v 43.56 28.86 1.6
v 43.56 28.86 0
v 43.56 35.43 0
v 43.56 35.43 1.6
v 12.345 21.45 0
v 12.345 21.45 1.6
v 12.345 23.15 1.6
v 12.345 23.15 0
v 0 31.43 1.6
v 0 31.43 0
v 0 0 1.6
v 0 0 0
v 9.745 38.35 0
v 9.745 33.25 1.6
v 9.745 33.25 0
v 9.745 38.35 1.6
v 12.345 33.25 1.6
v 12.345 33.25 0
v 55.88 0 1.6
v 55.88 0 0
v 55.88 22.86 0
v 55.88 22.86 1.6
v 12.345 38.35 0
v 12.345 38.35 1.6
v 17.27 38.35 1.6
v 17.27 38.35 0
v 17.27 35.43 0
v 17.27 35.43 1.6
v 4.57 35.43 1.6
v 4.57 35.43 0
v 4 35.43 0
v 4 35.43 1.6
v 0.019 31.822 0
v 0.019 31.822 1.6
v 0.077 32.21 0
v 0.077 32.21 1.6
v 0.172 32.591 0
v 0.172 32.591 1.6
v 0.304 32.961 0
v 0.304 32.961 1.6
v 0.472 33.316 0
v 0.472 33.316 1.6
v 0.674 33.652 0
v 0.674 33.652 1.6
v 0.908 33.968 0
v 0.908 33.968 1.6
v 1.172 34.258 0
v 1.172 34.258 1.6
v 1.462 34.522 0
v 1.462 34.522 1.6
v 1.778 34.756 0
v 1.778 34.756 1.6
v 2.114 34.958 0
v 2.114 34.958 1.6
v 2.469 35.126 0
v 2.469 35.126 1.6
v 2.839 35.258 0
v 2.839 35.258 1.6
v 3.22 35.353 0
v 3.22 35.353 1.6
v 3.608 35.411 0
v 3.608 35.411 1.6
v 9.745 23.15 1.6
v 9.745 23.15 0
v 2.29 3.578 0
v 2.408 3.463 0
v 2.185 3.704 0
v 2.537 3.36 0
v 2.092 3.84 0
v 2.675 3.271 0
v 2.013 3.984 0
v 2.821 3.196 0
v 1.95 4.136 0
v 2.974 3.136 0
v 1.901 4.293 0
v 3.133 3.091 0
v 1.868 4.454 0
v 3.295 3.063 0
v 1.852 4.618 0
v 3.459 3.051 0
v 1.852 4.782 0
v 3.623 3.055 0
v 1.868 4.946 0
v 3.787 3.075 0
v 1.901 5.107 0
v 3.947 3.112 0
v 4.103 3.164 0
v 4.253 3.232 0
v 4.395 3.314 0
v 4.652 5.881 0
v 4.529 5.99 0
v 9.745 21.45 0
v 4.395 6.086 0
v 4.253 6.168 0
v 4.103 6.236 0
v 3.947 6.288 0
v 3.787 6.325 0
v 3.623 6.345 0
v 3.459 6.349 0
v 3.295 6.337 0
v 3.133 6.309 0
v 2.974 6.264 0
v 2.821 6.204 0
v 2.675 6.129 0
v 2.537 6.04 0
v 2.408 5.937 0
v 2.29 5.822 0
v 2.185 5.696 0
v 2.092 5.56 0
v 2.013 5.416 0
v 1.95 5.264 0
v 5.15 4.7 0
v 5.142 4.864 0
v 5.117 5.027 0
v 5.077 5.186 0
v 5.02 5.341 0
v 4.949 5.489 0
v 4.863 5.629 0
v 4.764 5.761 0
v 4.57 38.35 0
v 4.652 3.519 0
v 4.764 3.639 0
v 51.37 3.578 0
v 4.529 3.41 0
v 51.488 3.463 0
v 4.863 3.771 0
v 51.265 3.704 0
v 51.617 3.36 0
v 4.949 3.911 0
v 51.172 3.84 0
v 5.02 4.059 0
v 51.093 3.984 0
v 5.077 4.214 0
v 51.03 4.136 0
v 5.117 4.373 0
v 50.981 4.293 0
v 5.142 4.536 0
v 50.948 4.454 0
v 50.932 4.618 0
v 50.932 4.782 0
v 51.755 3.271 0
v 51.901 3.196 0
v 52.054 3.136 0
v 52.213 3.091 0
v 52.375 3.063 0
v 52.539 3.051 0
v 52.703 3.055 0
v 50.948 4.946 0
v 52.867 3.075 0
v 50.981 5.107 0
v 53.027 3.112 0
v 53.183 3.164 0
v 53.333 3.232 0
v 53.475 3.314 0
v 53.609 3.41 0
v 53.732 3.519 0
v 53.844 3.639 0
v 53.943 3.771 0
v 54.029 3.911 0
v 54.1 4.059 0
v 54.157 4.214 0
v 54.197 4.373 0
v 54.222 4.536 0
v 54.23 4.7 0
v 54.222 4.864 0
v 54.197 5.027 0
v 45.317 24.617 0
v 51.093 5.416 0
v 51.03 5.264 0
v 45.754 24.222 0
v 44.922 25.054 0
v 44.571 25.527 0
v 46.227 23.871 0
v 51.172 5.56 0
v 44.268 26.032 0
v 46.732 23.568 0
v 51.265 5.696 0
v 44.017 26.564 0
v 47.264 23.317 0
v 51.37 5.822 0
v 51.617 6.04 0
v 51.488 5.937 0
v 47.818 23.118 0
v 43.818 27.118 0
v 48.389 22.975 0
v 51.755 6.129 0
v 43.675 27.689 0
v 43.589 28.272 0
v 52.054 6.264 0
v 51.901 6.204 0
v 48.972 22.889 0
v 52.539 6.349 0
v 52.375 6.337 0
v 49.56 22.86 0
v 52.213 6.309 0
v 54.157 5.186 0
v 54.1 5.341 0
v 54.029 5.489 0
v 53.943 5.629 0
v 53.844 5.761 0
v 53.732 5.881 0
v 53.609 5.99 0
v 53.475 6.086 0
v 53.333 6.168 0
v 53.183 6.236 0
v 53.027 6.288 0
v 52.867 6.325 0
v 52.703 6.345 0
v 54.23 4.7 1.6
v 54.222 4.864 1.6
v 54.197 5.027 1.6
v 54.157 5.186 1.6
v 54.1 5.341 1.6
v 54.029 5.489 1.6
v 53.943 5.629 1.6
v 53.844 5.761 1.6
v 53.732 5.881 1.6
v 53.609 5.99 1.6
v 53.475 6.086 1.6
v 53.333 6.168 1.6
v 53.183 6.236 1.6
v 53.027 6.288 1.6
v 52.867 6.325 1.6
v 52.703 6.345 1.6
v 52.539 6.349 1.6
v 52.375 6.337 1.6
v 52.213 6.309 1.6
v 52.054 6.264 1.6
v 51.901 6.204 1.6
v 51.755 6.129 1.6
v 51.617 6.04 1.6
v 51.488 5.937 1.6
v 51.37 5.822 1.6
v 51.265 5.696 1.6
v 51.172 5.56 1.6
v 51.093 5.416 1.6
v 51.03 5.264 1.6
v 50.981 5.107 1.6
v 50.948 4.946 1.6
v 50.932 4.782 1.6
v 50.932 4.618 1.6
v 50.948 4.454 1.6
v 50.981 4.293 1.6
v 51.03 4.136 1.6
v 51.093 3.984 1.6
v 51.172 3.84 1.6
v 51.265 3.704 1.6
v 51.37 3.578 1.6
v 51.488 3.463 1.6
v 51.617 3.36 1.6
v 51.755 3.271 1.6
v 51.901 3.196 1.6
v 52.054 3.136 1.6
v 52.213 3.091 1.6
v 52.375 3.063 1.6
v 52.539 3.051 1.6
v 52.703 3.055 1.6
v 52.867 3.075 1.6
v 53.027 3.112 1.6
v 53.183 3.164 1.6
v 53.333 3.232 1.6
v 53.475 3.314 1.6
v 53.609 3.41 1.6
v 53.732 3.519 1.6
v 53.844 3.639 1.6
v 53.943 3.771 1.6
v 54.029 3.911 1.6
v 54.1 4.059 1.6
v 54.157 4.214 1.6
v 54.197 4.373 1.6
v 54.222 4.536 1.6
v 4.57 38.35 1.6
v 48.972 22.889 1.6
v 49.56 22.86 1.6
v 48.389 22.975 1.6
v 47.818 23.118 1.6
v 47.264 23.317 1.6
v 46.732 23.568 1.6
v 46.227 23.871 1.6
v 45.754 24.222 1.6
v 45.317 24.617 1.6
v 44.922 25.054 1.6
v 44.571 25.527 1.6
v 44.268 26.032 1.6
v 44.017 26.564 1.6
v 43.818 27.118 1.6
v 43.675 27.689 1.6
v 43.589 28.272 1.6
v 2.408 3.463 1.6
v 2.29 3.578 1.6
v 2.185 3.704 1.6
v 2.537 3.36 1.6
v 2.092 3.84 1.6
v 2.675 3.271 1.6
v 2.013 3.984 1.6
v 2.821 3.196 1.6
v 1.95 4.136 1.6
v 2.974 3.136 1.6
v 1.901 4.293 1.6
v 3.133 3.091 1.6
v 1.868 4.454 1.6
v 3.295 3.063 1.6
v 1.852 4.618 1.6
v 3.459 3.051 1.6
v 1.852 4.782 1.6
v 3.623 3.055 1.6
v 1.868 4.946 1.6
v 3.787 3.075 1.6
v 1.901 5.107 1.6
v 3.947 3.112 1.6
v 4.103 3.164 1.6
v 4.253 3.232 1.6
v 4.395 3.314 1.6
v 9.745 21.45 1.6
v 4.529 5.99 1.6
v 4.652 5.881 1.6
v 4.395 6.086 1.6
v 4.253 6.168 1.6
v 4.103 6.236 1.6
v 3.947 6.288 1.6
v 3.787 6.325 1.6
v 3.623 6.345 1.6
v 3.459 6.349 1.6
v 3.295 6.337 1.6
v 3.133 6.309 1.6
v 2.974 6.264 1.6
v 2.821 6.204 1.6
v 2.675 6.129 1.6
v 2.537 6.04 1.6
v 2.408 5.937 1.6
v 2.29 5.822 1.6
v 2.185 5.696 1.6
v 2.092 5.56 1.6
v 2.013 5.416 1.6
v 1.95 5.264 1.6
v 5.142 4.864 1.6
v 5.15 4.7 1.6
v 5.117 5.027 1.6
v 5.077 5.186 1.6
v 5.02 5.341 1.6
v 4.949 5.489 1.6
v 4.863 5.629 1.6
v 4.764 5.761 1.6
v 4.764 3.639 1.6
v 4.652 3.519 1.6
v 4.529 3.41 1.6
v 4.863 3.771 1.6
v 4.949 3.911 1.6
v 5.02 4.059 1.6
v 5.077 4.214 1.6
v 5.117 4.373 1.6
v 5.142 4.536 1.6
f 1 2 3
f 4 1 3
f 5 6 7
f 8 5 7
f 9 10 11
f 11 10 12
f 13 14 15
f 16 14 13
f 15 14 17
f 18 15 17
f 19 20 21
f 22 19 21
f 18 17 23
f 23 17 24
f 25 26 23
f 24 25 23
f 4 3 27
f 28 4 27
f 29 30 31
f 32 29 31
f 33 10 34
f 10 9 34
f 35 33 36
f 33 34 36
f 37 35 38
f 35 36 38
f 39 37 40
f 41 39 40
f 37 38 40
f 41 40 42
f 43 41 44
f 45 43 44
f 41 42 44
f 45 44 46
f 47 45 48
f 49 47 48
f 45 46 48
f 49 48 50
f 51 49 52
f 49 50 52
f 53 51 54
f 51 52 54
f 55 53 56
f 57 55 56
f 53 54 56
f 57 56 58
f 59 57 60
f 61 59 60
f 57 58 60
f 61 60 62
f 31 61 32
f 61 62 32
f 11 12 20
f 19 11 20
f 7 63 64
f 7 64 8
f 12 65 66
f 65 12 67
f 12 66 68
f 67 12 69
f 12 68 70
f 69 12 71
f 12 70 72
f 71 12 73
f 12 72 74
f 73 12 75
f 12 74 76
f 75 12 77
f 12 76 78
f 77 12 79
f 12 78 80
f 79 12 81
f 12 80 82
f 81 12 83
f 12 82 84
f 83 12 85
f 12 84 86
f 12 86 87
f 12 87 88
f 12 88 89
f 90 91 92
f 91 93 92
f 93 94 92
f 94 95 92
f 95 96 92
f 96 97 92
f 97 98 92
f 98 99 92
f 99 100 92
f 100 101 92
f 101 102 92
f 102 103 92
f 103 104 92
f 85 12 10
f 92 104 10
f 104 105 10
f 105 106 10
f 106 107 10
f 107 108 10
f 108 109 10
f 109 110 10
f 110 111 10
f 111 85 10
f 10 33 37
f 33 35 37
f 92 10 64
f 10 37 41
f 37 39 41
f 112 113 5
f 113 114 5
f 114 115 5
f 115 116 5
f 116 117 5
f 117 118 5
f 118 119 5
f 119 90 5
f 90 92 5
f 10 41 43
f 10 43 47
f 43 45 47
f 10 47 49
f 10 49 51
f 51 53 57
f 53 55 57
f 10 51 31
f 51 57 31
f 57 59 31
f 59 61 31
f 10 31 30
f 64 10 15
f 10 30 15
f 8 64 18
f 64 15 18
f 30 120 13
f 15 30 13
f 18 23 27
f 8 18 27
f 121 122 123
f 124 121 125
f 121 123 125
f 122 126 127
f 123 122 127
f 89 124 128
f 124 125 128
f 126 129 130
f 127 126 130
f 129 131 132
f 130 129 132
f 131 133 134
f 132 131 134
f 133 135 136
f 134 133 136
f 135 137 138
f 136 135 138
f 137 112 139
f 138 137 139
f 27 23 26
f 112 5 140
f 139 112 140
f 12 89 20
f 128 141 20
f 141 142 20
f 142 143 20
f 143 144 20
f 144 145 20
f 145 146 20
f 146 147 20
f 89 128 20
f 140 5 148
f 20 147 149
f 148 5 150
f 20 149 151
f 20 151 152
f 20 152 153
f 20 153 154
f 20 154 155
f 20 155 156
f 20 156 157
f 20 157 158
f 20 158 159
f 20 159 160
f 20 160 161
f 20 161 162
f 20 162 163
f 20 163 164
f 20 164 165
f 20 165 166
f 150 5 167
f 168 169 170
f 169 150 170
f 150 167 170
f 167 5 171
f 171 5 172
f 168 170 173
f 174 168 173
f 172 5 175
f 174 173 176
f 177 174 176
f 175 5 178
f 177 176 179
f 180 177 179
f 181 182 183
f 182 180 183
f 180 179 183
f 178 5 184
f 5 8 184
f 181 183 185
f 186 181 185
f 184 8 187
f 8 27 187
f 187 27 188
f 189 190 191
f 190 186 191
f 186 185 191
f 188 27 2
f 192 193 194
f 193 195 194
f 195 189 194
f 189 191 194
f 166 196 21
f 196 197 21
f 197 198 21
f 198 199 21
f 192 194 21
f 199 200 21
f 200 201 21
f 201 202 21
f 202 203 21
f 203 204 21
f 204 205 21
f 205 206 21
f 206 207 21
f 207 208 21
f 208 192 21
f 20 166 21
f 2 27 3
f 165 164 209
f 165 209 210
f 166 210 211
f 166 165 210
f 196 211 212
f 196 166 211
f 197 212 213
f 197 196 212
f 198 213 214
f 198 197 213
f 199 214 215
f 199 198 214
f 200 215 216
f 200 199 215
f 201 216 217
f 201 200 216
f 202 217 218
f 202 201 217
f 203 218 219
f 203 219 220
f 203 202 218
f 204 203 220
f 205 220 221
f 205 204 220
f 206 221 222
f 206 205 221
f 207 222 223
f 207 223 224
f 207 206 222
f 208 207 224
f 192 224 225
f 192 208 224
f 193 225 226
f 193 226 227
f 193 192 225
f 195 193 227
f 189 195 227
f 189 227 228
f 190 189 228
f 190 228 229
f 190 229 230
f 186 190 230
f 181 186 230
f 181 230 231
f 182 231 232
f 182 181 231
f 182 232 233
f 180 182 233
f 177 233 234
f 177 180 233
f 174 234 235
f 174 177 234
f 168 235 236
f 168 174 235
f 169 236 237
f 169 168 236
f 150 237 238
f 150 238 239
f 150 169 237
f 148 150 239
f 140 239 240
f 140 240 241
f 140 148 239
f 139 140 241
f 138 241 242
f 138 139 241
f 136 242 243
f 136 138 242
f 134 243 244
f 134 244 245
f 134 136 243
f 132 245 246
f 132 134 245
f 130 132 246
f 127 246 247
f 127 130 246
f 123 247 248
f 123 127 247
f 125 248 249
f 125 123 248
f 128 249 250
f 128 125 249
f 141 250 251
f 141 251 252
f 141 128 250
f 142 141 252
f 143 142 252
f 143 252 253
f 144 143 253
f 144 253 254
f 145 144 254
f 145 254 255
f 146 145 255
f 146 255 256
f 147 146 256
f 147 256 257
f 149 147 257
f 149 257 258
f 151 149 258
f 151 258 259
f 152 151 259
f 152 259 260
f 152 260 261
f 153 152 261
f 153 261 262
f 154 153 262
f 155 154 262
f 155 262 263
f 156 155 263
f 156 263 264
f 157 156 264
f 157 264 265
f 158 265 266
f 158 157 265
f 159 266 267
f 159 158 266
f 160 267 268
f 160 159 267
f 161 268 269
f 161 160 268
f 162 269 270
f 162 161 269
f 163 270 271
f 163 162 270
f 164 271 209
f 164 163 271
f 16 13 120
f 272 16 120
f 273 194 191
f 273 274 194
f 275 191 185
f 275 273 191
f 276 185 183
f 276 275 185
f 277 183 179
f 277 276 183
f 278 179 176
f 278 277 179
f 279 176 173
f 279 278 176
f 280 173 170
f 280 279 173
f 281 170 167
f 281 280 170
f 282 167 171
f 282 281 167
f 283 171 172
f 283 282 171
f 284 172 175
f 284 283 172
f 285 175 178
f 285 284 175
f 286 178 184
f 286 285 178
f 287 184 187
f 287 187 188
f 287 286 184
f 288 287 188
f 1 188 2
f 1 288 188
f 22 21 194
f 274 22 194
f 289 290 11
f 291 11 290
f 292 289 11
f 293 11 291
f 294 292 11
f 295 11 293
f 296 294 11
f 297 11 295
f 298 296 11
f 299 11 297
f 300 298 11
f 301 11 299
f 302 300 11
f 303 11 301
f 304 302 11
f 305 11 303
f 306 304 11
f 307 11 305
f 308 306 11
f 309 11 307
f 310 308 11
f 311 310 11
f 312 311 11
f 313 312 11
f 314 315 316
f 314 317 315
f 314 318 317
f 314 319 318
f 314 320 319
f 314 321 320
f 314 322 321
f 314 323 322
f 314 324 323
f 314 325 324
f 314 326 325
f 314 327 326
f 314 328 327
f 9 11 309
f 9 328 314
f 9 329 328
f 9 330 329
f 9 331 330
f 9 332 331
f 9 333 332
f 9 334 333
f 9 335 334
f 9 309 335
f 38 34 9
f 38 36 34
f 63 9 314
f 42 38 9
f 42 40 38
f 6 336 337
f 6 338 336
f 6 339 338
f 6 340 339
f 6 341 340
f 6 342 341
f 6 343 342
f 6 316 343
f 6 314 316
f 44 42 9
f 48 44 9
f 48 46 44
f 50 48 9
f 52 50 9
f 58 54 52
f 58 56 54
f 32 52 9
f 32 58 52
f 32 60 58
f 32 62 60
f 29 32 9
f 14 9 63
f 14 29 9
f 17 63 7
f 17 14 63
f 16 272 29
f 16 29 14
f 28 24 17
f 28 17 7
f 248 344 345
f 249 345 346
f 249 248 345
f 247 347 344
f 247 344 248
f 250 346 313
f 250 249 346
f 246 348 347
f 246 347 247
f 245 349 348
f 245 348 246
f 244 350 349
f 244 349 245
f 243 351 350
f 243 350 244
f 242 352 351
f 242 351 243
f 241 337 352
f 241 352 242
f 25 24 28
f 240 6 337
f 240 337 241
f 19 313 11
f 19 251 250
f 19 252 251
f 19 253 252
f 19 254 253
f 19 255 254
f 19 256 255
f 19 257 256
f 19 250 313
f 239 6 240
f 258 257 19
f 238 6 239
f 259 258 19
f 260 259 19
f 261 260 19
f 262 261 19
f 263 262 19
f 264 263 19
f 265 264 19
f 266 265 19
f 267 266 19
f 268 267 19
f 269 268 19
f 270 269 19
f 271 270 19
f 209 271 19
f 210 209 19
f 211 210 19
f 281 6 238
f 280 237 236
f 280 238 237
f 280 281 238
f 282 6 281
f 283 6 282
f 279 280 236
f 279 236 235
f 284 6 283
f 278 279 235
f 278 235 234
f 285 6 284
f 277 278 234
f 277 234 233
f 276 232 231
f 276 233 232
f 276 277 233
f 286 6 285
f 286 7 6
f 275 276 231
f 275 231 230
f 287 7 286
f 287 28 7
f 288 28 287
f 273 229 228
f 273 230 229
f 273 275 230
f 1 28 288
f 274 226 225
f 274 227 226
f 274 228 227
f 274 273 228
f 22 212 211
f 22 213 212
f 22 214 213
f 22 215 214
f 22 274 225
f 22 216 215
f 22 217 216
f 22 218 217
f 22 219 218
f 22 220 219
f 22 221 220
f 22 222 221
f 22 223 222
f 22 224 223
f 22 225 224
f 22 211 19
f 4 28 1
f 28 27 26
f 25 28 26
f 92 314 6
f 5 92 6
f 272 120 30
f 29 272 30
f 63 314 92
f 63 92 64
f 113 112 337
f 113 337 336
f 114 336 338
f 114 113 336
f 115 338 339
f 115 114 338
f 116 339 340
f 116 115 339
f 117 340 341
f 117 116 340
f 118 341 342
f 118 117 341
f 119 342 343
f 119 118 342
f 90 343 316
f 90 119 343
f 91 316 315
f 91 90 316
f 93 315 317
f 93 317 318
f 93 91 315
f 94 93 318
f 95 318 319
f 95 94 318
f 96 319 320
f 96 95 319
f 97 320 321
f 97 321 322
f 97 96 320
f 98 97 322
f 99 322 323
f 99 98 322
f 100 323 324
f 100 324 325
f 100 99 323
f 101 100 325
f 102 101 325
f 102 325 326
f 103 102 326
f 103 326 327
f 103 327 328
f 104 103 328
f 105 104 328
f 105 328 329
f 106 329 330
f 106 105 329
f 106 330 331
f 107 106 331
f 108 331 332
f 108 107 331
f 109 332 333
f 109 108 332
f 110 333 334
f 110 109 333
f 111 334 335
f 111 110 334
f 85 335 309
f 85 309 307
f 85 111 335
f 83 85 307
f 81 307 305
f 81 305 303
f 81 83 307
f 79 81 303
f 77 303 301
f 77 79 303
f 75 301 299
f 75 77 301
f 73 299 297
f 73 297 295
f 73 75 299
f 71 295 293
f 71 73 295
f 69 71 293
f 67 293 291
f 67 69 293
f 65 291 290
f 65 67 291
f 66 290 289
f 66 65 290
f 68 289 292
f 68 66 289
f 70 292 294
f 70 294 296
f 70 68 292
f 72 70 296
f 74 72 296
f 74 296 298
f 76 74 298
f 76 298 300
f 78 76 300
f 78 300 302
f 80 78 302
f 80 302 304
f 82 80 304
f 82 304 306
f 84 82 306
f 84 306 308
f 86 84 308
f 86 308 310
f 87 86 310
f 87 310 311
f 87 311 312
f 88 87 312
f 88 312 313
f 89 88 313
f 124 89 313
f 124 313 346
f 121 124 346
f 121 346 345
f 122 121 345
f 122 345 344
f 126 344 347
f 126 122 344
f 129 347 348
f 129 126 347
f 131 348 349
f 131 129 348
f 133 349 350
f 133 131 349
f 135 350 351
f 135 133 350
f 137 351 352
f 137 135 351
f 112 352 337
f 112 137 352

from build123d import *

# Parameters (mm, degrees)
F0_R     = 1.65
F1_DEPTH = 1.6
F2_R     = 4
F3_R     = 6
F4_W     = 2.6
F4_H     = 5.1
F4_H_2   = 1.7
F5_DEPTH = 1.601


with BuildPart() as f1:
    # F0 (on Top) → F1 (new body)
    with BuildSketch(Plane.XY):
        Polygon((0, 35.43), (0, 0), (55.88, 0), (55.88, 22.86), (43.56, 22.86), (43.56, 35.43), (17.27, 35.43), (17.27, 38.35), (4.57, 38.35), (4.57, 35.43), align=None)
        with Locations((3.5, 4.7)):
            Circle(F0_R, mode=Mode.SUBTRACT)
        with Locations((52.58, 4.7)):
            Circle(F0_R, mode=Mode.SUBTRACT)
    extrude(amount=F1_DEPTH)

    # F2
    f2_edges = [f1.edges().sort_by_distance(p)[0] for p in [
        (0, 35.43, 0.8),
    ]]
    fillet(f2_edges, radius=F2_R)

    # F3
    f3_edges = [f1.edges().sort_by_distance(p)[0] for p in [
        (43.56, 22.86, 0.8),
    ]]
    fillet(f3_edges, radius=F3_R)

    # F4 (on face) → F5 (cut, through all)
    with BuildSketch(Plane.XY.offset(1.6)):
        with Locations((11.045, 35.8)):
            Rectangle(F4_W, F4_H)
        with Locations((11.045, 22.3)):
            Rectangle(F4_W, F4_H_2)
    extrude(amount=-F5_DEPTH, mode=Mode.SUBTRACT)


solid = f1.part
